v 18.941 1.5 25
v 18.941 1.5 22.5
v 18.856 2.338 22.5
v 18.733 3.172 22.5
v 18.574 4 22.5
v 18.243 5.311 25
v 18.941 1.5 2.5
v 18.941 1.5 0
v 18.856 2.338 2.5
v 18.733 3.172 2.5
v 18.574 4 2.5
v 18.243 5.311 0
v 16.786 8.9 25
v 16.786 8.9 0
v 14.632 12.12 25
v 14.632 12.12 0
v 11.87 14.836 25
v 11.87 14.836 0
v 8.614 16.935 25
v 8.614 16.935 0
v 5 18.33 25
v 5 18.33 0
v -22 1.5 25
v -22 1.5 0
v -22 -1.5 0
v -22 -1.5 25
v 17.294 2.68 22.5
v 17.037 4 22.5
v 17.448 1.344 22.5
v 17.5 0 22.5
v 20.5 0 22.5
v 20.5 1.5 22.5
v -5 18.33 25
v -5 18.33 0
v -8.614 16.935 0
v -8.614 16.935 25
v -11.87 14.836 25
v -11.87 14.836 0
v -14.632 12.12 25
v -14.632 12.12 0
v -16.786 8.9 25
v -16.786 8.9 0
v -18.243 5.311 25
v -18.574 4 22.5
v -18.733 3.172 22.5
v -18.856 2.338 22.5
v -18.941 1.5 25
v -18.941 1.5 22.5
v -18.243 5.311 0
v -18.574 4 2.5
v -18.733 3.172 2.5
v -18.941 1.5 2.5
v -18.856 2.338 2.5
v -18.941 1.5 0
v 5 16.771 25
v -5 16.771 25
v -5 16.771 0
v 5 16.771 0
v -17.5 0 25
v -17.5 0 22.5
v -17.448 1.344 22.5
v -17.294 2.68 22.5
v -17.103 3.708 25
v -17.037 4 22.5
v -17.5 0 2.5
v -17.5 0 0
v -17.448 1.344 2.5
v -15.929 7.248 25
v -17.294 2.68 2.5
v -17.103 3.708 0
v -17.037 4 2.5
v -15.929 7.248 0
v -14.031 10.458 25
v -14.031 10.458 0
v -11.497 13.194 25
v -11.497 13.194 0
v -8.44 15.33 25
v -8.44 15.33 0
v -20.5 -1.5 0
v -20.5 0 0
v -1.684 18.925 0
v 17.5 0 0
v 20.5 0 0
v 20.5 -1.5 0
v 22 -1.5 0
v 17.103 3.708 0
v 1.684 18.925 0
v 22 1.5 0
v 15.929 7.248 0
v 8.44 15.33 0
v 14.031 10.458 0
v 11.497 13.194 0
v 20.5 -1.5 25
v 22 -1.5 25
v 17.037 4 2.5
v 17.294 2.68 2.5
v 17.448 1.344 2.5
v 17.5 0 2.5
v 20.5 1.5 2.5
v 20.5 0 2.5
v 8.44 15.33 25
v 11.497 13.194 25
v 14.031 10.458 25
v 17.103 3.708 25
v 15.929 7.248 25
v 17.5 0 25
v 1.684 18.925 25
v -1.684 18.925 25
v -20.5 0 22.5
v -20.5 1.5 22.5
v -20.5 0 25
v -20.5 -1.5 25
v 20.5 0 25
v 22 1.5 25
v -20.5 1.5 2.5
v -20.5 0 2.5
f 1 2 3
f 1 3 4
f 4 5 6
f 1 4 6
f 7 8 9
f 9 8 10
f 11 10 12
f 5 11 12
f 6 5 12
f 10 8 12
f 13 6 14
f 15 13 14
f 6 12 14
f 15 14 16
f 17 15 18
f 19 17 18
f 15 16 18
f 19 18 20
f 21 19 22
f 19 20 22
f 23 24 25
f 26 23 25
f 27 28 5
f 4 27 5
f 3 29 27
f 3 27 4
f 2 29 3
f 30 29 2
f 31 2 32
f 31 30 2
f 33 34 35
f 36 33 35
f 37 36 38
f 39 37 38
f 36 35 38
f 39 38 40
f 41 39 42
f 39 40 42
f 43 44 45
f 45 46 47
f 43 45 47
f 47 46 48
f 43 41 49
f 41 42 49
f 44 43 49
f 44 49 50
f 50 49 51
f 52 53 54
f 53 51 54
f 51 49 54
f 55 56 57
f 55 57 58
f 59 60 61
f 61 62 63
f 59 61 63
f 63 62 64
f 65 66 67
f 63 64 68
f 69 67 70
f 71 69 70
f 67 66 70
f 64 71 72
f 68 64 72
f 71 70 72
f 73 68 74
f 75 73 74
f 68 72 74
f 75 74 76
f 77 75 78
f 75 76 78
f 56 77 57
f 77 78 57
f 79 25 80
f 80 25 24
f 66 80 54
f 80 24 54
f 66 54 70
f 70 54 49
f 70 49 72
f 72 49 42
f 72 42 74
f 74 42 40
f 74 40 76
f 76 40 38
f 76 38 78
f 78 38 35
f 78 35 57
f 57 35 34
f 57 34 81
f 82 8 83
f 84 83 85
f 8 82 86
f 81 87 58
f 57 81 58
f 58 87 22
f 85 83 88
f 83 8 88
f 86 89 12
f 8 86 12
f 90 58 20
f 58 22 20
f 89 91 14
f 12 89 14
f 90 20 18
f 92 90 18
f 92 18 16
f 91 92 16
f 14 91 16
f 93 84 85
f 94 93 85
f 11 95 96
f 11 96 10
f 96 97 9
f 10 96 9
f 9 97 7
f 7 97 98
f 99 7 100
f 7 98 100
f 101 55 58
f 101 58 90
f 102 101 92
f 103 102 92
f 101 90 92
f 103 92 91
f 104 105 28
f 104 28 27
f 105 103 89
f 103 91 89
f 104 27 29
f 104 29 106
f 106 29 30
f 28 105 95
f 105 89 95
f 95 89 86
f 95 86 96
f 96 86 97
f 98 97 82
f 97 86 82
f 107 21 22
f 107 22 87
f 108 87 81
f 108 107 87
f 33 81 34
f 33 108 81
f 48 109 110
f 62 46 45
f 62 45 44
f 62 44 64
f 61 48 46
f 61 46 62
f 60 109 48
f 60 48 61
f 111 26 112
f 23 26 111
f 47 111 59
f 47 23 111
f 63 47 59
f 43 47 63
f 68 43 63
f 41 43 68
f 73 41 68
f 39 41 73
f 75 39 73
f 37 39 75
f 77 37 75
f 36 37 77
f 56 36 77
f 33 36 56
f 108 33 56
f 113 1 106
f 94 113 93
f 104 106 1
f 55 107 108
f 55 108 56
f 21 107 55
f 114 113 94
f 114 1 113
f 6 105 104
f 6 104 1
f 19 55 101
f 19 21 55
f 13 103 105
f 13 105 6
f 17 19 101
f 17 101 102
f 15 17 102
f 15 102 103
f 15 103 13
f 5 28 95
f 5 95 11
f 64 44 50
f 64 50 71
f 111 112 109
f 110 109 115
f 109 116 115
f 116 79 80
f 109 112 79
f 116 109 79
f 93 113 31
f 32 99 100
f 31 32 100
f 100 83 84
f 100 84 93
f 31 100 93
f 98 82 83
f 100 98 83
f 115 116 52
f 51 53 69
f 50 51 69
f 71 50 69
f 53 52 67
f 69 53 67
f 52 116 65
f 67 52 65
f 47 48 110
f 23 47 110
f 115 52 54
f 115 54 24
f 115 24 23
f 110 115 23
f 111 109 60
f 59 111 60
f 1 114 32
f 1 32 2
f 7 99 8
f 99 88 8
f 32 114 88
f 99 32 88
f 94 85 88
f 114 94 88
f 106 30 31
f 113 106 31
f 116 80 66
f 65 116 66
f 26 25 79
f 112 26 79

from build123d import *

# Parameters (mm, degrees)
F1_DEPTH = 25
F3_DEPTH = 25
F4_W     = 41
F4_H     = 20
F5_DEPTH = 4


with BuildPart() as f1:
    # F0 (on Top) → F1 (new body)
    with BuildSketch(Plane.XY):
        with BuildLine():
            ThreePointArc((-17.5, 0), (0, 17.5), (17.5, 0))
            Line((17.5, 0), (20.5, 0))
            Line((20.5, 0), (20.5, -1.5))
            Line((20.5, -1.5), (22, -1.5))
            Line((22, -1.5), (22, 1.5))
            Line((22, 1.5), (18.940697, 1.5))
            ThreePointArc((18.940697, 1.5), (0, 19), (-18.940697, 1.5))
            Line((-18.940697, 1.5), (-22, 1.5))
            Line((-22, 1.5), (-22, -1.5))
            Line((-22, -1.5), (-20.5, -1.5))
            Line((-20.5, -1.5), (-20.5, 0))
            Line((-20.5, 0), (-17.5, 0))
        make_face()
    extrude(amount=F1_DEPTH)

    # F2 (on face) → F3 (join)
    with BuildSketch(Plane.XY.offset(25)):
        with BuildLine():
            Line((5, 16.77051), (5, 18.330303))
            ThreePointArc((5, 18.330303), (0, 19), (-5, 18.330303))
            Line((-5, 18.330303), (-5, 16.77051))
            Line((-5, 16.77051), (5, 16.77051))
        make_face()
    extrude(amount=-F3_DEPTH)

    # F4 (on face) → F5 (cut)
    with BuildSketch(Plane.XZ):
        with Locations((0, 12.5)):
            Rectangle(F4_W, F4_H)
    extrude(amount=-F5_DEPTH, mode=Mode.SUBTRACT)


solid = f1.part
